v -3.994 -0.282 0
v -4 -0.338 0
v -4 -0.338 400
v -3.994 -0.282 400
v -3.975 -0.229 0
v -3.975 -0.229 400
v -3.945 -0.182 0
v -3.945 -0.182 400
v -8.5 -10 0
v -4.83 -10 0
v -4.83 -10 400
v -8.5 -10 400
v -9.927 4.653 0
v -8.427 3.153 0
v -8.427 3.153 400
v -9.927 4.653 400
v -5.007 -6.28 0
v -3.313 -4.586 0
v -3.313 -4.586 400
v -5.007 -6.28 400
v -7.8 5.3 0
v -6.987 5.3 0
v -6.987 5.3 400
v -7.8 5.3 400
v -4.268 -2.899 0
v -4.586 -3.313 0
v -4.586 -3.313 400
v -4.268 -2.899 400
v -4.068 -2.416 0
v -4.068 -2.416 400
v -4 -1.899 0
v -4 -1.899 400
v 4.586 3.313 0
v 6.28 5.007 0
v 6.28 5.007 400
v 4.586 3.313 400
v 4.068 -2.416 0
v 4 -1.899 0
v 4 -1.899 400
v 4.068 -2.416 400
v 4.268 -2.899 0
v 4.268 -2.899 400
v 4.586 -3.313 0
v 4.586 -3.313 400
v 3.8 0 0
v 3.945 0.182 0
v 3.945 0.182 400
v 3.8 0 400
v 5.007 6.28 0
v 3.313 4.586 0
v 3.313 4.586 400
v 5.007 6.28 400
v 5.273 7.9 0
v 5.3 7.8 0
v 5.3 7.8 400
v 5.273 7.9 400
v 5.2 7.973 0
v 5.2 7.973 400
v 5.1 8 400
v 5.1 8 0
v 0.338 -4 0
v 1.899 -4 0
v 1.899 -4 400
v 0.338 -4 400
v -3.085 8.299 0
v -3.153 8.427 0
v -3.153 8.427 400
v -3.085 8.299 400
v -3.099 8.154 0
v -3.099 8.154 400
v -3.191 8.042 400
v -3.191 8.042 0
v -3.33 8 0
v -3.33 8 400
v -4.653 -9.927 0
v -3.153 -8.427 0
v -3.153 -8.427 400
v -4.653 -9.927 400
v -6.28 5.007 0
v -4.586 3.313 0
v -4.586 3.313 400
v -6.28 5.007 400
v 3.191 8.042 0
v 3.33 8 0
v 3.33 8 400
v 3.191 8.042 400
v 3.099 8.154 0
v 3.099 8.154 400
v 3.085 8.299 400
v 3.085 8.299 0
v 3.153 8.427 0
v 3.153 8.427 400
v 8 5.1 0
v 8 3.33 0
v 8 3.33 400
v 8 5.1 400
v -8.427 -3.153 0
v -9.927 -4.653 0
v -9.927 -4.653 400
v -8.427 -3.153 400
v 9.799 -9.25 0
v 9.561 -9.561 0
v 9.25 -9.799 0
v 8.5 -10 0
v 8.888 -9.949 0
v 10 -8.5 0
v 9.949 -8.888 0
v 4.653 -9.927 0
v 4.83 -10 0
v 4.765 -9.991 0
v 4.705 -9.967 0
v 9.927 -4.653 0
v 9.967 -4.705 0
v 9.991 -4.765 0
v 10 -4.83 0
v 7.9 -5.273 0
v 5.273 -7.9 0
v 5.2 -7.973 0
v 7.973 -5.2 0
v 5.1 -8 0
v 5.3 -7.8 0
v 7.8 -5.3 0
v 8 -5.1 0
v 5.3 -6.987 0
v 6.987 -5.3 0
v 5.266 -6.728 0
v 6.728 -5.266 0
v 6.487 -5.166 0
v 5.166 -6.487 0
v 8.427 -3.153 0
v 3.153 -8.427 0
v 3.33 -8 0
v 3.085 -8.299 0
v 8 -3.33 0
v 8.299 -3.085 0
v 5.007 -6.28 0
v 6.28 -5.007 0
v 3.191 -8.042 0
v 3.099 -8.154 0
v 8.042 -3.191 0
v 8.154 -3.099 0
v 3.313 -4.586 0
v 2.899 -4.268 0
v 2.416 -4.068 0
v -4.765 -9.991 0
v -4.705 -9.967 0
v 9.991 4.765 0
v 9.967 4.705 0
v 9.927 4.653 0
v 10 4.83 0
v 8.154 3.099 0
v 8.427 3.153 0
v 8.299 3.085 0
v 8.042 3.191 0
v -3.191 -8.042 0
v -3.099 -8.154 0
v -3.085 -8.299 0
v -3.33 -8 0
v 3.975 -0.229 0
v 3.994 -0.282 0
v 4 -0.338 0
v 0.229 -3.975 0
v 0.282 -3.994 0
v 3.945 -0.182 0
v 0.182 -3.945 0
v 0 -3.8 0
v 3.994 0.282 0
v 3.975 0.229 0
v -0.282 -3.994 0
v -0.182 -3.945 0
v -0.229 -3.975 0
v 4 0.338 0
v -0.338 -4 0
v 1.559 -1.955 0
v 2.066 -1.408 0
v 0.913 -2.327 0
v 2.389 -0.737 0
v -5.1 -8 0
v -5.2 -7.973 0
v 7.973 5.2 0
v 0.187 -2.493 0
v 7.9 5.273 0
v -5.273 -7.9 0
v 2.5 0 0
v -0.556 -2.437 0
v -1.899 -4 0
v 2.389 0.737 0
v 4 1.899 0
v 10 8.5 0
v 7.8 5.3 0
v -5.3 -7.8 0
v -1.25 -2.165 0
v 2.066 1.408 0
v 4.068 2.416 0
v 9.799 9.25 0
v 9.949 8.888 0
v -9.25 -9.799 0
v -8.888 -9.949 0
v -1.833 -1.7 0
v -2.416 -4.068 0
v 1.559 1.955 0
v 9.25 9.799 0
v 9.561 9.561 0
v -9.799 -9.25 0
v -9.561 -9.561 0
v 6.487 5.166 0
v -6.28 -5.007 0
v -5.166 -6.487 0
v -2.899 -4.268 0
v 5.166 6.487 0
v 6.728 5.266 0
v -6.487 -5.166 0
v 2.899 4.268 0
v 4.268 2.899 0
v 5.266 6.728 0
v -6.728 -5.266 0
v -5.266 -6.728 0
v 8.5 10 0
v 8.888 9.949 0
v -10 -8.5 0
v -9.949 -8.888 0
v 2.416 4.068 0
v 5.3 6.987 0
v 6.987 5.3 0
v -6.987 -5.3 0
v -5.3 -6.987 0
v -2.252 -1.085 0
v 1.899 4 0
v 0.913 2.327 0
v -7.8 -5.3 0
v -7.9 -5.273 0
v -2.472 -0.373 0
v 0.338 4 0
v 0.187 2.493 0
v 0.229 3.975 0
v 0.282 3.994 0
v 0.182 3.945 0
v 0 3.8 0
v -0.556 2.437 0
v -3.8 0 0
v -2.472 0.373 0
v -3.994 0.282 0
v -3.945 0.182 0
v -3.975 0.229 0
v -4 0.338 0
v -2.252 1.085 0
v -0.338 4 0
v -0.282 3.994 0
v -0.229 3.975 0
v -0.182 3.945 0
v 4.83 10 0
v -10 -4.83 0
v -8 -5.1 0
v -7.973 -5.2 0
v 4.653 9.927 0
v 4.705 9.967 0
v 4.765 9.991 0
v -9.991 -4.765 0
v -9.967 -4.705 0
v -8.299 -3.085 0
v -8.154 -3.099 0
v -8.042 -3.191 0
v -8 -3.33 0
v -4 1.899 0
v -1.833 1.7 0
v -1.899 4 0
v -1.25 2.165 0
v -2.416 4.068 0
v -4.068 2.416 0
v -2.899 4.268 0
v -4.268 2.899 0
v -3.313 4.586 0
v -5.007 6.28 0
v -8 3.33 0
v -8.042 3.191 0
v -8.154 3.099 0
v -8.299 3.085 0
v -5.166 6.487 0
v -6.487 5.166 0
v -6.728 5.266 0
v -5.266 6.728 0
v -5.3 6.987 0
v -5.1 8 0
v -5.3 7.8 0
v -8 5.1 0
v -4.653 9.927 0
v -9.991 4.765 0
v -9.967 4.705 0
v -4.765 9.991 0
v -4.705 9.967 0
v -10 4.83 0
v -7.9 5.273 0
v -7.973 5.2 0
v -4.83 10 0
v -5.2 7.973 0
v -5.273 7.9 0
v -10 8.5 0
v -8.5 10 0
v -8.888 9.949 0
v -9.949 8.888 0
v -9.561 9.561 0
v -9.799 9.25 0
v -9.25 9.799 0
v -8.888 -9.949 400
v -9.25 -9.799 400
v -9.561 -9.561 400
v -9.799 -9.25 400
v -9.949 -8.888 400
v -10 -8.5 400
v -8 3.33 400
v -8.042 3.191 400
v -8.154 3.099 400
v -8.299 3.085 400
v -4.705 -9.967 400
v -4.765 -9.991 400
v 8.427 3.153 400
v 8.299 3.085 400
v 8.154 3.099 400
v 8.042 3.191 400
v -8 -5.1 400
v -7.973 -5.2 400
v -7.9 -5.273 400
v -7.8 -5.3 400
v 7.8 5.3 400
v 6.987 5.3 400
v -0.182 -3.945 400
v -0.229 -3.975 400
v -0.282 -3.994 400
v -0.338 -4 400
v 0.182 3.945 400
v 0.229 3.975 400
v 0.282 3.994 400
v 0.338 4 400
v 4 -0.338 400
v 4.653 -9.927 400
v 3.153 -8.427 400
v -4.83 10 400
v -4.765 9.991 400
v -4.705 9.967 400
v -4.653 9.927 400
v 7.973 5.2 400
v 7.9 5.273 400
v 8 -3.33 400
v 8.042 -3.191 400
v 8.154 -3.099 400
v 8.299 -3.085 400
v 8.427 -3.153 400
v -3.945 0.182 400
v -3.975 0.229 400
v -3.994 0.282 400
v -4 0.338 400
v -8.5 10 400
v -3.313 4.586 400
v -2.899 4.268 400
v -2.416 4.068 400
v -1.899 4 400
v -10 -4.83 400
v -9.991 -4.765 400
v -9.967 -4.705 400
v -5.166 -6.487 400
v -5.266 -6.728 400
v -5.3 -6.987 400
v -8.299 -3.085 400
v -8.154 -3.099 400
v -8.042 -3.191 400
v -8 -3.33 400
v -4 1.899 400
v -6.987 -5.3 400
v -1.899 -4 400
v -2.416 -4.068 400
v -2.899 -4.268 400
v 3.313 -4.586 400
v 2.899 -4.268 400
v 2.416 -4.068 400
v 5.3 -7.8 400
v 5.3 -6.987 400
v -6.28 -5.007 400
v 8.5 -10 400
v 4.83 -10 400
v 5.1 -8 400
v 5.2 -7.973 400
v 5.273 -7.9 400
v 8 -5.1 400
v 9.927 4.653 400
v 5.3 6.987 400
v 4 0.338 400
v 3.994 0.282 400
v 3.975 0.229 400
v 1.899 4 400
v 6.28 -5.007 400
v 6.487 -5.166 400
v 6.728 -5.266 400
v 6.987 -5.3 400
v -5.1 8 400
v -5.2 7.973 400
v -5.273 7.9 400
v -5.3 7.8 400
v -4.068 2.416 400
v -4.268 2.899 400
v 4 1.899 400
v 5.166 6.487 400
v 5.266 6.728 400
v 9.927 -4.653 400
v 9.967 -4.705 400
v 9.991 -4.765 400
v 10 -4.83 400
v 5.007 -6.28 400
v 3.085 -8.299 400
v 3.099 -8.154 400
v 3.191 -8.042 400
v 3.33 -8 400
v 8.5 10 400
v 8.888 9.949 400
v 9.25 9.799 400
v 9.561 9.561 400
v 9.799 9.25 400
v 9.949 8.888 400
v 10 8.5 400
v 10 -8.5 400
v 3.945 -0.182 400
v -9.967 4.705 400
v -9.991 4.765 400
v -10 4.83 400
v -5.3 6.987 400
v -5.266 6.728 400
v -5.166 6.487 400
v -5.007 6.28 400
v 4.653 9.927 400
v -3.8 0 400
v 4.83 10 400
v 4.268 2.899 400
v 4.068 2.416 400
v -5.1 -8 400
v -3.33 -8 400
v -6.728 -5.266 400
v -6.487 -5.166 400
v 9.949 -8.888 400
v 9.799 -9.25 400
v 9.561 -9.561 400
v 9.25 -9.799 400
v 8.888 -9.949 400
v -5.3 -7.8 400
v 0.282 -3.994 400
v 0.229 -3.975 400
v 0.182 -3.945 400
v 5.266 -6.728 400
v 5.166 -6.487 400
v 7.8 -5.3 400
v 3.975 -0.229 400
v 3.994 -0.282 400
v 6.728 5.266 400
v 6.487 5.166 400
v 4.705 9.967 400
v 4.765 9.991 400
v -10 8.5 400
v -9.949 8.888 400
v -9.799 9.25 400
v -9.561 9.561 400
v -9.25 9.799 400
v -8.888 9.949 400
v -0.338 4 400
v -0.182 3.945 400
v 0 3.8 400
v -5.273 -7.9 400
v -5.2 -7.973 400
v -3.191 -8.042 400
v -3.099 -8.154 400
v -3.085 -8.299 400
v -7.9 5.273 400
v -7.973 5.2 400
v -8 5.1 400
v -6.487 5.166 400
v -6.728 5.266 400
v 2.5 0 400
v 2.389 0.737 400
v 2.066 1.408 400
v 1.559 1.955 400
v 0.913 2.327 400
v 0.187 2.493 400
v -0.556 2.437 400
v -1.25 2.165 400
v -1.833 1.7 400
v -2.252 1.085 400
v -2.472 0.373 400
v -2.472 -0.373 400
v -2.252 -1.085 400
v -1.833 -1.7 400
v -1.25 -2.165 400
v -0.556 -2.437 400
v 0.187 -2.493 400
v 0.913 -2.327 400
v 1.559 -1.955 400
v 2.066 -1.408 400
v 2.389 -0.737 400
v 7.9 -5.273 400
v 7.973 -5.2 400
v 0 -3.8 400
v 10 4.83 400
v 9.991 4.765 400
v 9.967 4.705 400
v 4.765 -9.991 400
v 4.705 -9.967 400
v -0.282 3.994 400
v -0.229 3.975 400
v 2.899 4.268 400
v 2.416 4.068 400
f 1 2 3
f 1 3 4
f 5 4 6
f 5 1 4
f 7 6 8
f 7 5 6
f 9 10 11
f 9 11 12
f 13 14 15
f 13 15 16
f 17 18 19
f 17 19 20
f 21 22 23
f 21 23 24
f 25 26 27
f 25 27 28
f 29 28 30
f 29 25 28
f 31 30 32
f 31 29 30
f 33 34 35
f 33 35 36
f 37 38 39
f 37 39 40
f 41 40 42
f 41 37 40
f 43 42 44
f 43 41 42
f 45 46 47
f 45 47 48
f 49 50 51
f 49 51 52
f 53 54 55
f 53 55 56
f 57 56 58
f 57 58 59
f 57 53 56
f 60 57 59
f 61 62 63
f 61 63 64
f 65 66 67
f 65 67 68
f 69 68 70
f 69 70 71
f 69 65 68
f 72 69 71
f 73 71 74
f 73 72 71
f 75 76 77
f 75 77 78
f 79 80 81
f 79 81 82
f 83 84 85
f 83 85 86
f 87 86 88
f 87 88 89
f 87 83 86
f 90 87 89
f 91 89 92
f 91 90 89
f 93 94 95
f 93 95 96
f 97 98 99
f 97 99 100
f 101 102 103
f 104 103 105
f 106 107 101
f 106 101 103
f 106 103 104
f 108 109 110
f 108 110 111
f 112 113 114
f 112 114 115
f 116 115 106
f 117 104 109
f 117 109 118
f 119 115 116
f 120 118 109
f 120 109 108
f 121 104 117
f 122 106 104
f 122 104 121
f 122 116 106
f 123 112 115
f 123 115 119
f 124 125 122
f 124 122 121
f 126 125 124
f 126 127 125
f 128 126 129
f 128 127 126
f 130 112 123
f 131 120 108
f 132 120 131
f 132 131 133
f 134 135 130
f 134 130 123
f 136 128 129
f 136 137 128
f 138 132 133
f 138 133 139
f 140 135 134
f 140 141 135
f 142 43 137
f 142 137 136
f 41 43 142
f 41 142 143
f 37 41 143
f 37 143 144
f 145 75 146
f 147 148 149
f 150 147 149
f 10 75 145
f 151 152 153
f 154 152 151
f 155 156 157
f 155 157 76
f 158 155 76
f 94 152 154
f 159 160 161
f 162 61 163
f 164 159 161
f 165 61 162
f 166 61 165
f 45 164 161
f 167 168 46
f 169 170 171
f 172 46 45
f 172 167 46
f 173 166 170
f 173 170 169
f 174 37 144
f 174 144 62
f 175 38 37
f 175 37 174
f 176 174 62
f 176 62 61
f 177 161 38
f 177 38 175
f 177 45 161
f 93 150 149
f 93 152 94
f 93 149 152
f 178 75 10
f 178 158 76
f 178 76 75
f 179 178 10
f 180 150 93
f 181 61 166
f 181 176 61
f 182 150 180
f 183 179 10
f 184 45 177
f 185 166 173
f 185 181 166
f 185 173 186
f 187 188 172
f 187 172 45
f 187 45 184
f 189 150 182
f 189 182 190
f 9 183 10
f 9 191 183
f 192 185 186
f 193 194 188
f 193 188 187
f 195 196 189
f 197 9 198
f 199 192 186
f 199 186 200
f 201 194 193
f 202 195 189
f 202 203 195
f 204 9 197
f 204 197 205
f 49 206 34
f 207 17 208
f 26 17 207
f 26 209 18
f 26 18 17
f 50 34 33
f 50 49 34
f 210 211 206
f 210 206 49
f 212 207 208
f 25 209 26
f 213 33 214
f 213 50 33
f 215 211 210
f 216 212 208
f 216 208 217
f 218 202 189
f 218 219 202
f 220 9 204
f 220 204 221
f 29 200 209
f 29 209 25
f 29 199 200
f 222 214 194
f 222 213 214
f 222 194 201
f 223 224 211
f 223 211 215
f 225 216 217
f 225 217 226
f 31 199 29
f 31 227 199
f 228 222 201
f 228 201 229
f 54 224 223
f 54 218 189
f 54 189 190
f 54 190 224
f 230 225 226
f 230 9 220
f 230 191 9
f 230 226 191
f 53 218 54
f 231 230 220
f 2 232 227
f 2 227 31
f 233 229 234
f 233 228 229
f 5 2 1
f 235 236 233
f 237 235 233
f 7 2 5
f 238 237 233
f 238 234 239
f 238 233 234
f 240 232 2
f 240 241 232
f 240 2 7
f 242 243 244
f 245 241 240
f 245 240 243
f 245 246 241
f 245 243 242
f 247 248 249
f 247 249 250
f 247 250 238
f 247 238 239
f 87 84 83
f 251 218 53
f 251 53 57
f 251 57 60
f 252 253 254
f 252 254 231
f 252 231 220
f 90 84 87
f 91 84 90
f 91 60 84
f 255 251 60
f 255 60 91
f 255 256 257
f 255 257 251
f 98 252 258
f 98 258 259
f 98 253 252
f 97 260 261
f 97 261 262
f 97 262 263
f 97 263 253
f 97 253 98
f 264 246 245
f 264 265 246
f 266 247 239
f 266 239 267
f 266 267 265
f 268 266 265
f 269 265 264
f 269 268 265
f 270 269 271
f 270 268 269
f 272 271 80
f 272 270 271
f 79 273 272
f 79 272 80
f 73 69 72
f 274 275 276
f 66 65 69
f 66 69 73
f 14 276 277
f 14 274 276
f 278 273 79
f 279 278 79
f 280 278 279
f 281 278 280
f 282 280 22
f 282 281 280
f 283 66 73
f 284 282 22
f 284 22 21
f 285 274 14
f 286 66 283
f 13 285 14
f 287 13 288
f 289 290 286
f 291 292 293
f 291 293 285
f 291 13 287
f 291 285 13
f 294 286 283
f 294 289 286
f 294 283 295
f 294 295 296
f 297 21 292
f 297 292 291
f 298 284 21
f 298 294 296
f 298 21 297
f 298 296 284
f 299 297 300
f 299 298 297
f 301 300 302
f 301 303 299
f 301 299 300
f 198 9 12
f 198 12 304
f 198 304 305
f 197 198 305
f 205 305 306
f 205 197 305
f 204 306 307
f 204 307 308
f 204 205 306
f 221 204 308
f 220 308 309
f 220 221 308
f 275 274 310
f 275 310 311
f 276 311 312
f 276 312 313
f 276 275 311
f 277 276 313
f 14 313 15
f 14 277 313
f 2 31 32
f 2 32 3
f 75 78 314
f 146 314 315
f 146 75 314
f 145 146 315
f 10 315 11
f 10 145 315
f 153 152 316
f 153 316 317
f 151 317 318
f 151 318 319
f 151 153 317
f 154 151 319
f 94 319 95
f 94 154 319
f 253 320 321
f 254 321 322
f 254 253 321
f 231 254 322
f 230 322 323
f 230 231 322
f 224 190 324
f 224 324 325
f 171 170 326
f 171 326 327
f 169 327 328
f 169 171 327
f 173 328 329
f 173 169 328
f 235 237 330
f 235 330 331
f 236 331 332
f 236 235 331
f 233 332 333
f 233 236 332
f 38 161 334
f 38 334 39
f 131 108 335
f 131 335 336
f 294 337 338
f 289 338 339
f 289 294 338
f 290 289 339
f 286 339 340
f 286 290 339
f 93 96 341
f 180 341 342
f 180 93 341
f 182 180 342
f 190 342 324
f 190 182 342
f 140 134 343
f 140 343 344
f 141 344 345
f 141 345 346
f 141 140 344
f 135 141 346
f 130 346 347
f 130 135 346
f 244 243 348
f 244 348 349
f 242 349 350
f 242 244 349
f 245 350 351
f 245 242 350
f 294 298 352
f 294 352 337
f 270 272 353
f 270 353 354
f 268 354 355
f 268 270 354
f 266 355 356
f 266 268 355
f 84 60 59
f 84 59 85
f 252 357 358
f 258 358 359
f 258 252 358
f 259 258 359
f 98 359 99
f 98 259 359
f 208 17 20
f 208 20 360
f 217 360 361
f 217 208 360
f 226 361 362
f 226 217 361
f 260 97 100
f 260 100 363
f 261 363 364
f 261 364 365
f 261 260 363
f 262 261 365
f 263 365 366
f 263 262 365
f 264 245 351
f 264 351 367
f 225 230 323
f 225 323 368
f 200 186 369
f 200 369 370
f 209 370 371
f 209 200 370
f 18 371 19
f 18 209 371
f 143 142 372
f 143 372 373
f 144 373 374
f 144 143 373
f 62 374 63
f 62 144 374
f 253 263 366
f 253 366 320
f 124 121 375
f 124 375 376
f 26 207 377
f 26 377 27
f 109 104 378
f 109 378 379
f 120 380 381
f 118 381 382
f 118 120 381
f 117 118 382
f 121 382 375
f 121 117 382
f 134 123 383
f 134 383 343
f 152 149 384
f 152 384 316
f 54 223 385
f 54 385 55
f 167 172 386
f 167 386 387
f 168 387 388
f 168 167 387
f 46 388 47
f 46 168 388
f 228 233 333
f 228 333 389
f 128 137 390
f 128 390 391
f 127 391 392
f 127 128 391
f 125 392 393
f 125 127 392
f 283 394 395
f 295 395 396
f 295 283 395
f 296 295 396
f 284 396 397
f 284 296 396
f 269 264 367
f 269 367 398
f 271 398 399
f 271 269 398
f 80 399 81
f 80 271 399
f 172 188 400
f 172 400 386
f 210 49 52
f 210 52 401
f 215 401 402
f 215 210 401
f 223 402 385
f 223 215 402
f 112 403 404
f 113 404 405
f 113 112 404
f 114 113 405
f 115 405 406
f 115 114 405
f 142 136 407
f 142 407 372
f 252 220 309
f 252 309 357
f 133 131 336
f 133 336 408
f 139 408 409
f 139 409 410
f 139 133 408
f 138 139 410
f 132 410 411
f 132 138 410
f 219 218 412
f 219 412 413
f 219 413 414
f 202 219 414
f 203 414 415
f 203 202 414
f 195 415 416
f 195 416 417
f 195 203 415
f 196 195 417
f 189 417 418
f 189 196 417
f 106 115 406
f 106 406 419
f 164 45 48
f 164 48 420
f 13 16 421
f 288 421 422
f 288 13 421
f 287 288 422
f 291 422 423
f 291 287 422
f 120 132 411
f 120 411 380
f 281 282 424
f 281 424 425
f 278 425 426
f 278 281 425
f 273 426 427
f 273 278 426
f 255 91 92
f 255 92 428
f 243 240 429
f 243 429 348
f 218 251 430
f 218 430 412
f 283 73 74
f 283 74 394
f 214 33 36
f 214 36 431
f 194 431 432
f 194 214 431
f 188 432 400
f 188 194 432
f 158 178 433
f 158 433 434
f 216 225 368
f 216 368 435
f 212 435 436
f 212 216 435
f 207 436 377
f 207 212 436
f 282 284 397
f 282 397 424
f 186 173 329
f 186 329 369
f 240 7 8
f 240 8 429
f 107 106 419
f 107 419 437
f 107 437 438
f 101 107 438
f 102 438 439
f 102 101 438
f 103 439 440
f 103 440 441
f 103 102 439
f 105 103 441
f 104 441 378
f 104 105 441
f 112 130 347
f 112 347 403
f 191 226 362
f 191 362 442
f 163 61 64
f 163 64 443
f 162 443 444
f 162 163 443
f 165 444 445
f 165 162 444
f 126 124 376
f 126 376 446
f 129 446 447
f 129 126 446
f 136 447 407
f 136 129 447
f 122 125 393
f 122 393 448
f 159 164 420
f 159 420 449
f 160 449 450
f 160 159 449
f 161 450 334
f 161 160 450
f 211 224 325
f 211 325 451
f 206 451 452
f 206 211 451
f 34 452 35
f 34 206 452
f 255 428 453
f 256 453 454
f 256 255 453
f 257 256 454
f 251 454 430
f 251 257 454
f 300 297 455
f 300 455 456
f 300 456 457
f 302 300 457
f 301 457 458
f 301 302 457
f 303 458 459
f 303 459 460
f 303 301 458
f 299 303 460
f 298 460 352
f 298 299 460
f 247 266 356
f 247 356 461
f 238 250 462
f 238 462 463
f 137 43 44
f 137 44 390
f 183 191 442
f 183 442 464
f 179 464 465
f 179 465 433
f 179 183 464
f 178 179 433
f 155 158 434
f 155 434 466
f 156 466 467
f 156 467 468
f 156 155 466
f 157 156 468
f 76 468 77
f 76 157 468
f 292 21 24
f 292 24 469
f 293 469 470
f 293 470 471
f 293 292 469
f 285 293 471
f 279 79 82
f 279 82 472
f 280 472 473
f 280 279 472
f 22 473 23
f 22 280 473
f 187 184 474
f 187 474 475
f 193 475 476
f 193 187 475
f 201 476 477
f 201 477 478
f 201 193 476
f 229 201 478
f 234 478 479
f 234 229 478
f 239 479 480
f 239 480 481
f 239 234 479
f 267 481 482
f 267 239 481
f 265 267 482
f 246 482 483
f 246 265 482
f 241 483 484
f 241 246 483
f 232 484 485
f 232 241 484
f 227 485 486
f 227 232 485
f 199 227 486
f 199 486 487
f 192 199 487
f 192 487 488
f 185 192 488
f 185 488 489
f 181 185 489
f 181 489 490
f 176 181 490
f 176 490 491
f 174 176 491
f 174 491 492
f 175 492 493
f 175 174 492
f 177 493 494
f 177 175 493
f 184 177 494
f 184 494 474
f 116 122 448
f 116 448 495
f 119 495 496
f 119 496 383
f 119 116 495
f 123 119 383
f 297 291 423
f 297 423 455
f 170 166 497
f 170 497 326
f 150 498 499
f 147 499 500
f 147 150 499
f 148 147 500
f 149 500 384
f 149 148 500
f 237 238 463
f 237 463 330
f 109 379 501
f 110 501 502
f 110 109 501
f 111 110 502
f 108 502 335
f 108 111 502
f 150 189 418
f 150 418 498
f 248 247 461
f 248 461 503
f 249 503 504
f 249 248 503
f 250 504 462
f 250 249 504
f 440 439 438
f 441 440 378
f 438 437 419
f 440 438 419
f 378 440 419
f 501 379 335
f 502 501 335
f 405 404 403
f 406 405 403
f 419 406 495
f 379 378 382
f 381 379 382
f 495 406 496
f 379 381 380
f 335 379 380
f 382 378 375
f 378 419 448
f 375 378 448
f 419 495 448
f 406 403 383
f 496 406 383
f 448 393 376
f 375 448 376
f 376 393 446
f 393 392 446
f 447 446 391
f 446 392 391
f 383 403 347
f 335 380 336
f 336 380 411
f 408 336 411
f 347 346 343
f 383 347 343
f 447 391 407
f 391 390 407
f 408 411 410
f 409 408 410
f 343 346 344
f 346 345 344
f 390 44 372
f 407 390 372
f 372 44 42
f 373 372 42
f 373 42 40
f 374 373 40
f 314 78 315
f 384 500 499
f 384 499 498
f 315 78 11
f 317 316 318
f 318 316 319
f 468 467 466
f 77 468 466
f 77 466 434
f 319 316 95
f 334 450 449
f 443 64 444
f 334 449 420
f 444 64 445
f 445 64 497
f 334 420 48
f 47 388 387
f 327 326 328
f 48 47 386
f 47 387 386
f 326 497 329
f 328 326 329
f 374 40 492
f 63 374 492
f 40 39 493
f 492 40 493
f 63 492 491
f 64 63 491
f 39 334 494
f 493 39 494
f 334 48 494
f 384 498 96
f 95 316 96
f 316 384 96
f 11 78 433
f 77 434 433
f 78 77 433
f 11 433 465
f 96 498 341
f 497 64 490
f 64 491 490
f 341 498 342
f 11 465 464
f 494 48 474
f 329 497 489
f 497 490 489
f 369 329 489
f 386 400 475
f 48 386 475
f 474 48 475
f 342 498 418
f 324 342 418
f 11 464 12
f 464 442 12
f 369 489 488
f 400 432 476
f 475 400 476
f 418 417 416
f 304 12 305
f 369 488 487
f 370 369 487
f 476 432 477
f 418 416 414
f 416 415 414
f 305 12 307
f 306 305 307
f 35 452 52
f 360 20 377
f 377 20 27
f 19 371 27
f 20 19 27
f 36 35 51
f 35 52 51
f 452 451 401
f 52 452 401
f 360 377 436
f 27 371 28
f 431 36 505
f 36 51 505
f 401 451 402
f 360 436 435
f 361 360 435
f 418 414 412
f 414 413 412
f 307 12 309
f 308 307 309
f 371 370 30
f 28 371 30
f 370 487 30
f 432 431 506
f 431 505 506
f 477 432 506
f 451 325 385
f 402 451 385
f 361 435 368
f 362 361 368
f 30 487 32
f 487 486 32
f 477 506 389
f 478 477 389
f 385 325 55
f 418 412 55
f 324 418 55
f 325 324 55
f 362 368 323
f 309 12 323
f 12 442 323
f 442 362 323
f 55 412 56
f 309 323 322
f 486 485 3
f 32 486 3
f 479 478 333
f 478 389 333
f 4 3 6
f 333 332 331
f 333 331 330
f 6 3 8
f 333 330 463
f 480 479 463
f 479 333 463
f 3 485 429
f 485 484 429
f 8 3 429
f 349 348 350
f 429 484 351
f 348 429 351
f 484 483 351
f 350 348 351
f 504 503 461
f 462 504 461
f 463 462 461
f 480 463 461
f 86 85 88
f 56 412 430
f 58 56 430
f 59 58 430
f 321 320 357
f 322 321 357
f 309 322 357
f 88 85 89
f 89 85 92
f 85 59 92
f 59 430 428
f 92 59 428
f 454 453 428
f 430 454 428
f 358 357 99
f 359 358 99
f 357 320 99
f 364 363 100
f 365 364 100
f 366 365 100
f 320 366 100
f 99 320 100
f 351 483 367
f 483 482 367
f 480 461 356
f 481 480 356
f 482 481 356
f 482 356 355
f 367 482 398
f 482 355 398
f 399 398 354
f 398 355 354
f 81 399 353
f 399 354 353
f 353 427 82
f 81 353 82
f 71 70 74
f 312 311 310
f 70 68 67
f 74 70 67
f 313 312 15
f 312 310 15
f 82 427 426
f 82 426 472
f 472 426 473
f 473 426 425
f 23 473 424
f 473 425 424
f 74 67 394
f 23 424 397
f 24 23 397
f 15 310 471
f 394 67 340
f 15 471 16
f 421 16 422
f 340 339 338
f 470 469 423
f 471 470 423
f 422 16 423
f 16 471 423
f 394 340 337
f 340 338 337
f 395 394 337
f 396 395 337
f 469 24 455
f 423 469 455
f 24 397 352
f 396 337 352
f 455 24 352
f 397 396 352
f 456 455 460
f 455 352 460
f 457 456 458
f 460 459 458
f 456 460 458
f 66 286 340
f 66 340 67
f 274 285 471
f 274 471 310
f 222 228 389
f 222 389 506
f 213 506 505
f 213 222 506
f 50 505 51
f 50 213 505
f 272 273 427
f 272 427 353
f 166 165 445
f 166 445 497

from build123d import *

# Parameters (mm, degrees)
MODEL_R         = 2.5
EXTRUDE_1_DEPTH = 400


with BuildPart() as part:
    # Model → Бобышка-Вытянуть1 (new body)
    with BuildSketch(Plane.XY):
        with BuildLine():
            Line((-4, 0.337695265), (-4, 1.898780669))
            ThreePointArc((-4, 1.898780669), (-4.152240935, 2.664147534), (-4.585786438, 3.312994231))
            Line((-4.585786438, 3.312994231), (-6.279898987, 5.007106781))
            ThreePointArc((-6.279898987, 5.007106781), (-6.604322336, 5.223879533), (-6.987005769, 5.3))
            Line((-6.987005769, 5.3), (-7.8, 5.3))
            ThreePointArc((-7.8, 5.3), (-7.941421356, 5.241421356), (-8, 5.1))
            Line((-8, 5.1), (-8, 3.33))
            ThreePointArc((-8, 3.33), (-8.154329142, 3.099030117), (-8.426776695, 3.153223305))
            Line((-8.426776695, 3.153223305), (-9.926776695, 4.653223305))
            ThreePointArc((-9.926776695, 4.653223305), (-9.980969883, 4.734329142), (-10, 4.83))
            Line((-10, 4.83), (-10, 8.5))
            ThreePointArc((-10, 8.5), (-9.560660172, 9.560660172), (-8.5, 10))
            Line((-8.5, 10), (-4.83, 10))
            ThreePointArc((-4.83, 10), (-4.734329142, 9.980969883), (-4.653223305, 9.926776695))
            Line((-4.653223305, 9.926776695), (-3.153223305, 8.426776695))
            ThreePointArc((-3.153223305, 8.426776695), (-3.099030117, 8.154329142), (-3.33, 8))
            Line((-3.33, 8), (-5.1, 8))
            ThreePointArc((-5.1, 8), (-5.241421356, 7.941421356), (-5.3, 7.8))
            Line((-5.3, 7.8), (-5.3, 6.987005769))
            ThreePointArc((-5.3, 6.987005769), (-5.223879533, 6.604322336), (-5.007106781, 6.279898987))
            Line((-5.007106781, 6.279898987), (-3.312994231, 4.585786438))
            ThreePointArc((-3.312994231, 4.585786438), (-2.664147534, 4.152240935), (-1.898780669, 4))
            Line((-1.898780669, 4), (-0.337695265, 4))
            ThreePointArc((-0.337695265, 4), (-0.254943529, 3.98590708), (-0.181521503, 3.945217202))
            Line((-0.181521503, 3.945217202), (0, 3.8))
            Line((0, 3.8), (0.181521503, 3.945217202))
            ThreePointArc((0.181521503, 3.945217202), (0.254943529, 3.98590708), (0.337695265, 4))
            Line((0.337695265, 4), (1.898780669, 4))
            ThreePointArc((1.898780669, 4), (2.664147534, 4.152240935), (3.312994231, 4.585786438))
            Line((3.312994231, 4.585786438), (5.007106781, 6.279898987))
            ThreePointArc((5.007106781, 6.279898987), (5.223879533, 6.604322336), (5.3, 6.987005769))
            Line((5.3, 6.987005769), (5.3, 7.8))
            ThreePointArc((5.3, 7.8), (5.241421356, 7.941421356), (5.1, 8))
            Line((5.1, 8), (3.33, 8))
            ThreePointArc((3.33, 8), (3.099030117, 8.154329142), (3.153223305, 8.426776695))
            Line((3.153223305, 8.426776695), (4.653223305, 9.926776695))
            ThreePointArc((4.653223305, 9.926776695), (4.734329142, 9.980969883), (4.83, 10))
            Line((4.83, 10), (8.5, 10))
            ThreePointArc((8.5, 10), (9.560660172, 9.560660172), (10, 8.5))
            Line((10, 8.5), (10, 4.83))
            ThreePointArc((10, 4.83), (9.980969883, 4.734329142), (9.926776695, 4.653223305))
            Line((9.926776695, 4.653223305), (8.426776695, 3.153223305))
            ThreePointArc((8.426776695, 3.153223305), (8.154329142, 3.099030117), (8, 3.33))
            Line((8, 3.33), (8, 5.1))
            ThreePointArc((8, 5.1), (7.941421356, 5.241421356), (7.8, 5.3))
            Line((7.8, 5.3), (6.987005769, 5.3))
            ThreePointArc((6.987005769, 5.3), (6.604322336, 5.223879533), (6.279898987, 5.007106781))
            Line((6.279898987, 5.007106781), (4.585786438, 3.312994231))
            ThreePointArc((4.585786438, 3.312994231), (4.152240935, 2.664147534), (4, 1.898780669))
            Line((4, 1.898780669), (4, 0.337695265))
            ThreePointArc((4, 0.337695265), (3.98590708, 0.254943529), (3.945217202, 0.181521503))
            Line((3.945217202, 0.181521503), (3.8, 0))
            Line((3.8, 0), (3.945217202, -0.181521503))
            ThreePointArc((3.945217202, -0.181521503), (3.98590708, -0.254943529), (4, -0.337695265))
            Line((4, -0.337695265), (4, -1.898780669))
            ThreePointArc((4, -1.898780669), (4.152240935, -2.664147534), (4.585786438, -3.312994231))
            Line((4.585786438, -3.312994231), (6.279898987, -5.007106781))
            ThreePointArc((6.279898987, -5.007106781), (6.604322336, -5.223879533), (6.987005769, -5.3))
            Line((6.987005769, -5.3), (7.8, -5.3))
            ThreePointArc((7.8, -5.3), (7.941421356, -5.241421356), (8, -5.1))
            Line((8, -5.1), (8, -3.33))
            ThreePointArc((8, -3.33), (8.154329142, -3.099030117), (8.426776695, -3.153223305))
            Line((8.426776695, -3.153223305), (9.926776695, -4.653223305))
            ThreePointArc((9.926776695, -4.653223305), (9.980969883, -4.734329142), (10, -4.83))
            Line((10, -4.83), (10, -8.5))
            ThreePointArc((10, -8.5), (9.560660172, -9.560660172), (8.5, -10))
            Line((8.5, -10), (4.83, -10))
            ThreePointArc((4.83, -10), (4.734329142, -9.980969883), (4.653223305, -9.926776695))
            Line((4.653223305, -9.926776695), (3.153223305, -8.426776695))
            ThreePointArc((3.153223305, -8.426776695), (3.099030117, -8.154329142), (3.33, -8))
            Line((3.33, -8), (5.1, -8))
            ThreePointArc((5.1, -8), (5.241421356, -7.941421356), (5.3, -7.8))
            Line((5.3, -7.8), (5.3, -6.987005769))
            ThreePointArc((5.3, -6.987005769), (5.223879533, -6.604322336), (5.007106781, -6.279898987))
            Line((5.007106781, -6.279898987), (3.312994231, -4.585786438))
            ThreePointArc((3.312994231, -4.585786438), (2.664147534, -4.152240935), (1.898780669, -4))
            Line((1.898780669, -4), (0.337695265, -4))
            ThreePointArc((0.337695265, -4), (0.254943529, -3.98590708), (0.181521503, -3.945217202))
            Line((0.181521503, -3.945217202), (0, -3.8))
            Line((0, -3.8), (-0.181521503, -3.945217202))
            ThreePointArc((-0.181521503, -3.945217202), (-0.254943529, -3.98590708), (-0.337695265, -4))
            Line((-0.337695265, -4), (-1.898780669, -4))
            ThreePointArc((-1.898780669, -4), (-2.664147534, -4.152240935), (-3.312994231, -4.585786438))
            Line((-3.312994231, -4.585786438), (-5.007106781, -6.279898987))
            ThreePointArc((-5.007106781, -6.279898987), (-5.223879533, -6.604322336), (-5.3, -6.987005769))
            Line((-5.3, -6.987005769), (-5.3, -7.8))
            ThreePointArc((-5.3, -7.8), (-5.241421356, -7.941421356), (-5.1, -8))
            Line((-5.1, -8), (-3.33, -8))
            ThreePointArc((-3.33, -8), (-3.099030117, -8.154329142), (-3.153223305, -8.426776695))
            Line((-3.153223305, -8.426776695), (-4.653223305, -9.926776695))
            ThreePointArc((-4.653223305, -9.926776695), (-4.734329142, -9.980969883), (-4.83, -10))
            Line((-4.83, -10), (-8.5, -10))
            ThreePointArc((-8.5, -10), (-9.560660172, -9.560660172), (-10, -8.5))
            Line((-10, -8.5), (-10, -4.83))
            ThreePointArc((-10, -4.83), (-9.980969883, -4.734329142), (-9.926776695, -4.653223305))
            Line((-9.926776695, -4.653223305), (-8.426776695, -3.153223305))
            ThreePointArc((-8.426776695, -3.153223305), (-8.154329142, -3.099030117), (-8, -3.33))
            Line((-8, -3.33), (-8, -5.1))
            ThreePointArc((-8, -5.1), (-7.941421356, -5.241421356), (-7.8, -5.3))
            Line((-7.8, -5.3), (-6.987005769, -5.3))
            ThreePointArc((-6.987005769, -5.3), (-6.604322336, -5.223879533), (-6.279898987, -5.007106781))
            Line((-6.279898987, -5.007106781), (-4.585786438, -3.312994231))
            ThreePointArc((-4.585786438, -3.312994231), (-4.152240935, -2.664147534), (-4, -1.898780669))
            Line((-4, -1.898780669), (-4, -0.337695265))
            ThreePointArc((-4, -0.337695265), (-3.98590708, -0.254943529), (-3.945217202, -0.181521503))
            Line((-3.945217202, -0.181521503), (-3.8, 0))
            Line((-3.8, 0), (-3.945217202, 0.181521503))
            ThreePointArc((-3.945217202, 0.181521503), (-3.98590708, 0.254943529), (-4, 0.337695265))
        make_face()
        Circle(MODEL_R, mode=Mode.SUBTRACT)
    extrude(amount=EXTRUDE_1_DEPTH)


solid = part.part
